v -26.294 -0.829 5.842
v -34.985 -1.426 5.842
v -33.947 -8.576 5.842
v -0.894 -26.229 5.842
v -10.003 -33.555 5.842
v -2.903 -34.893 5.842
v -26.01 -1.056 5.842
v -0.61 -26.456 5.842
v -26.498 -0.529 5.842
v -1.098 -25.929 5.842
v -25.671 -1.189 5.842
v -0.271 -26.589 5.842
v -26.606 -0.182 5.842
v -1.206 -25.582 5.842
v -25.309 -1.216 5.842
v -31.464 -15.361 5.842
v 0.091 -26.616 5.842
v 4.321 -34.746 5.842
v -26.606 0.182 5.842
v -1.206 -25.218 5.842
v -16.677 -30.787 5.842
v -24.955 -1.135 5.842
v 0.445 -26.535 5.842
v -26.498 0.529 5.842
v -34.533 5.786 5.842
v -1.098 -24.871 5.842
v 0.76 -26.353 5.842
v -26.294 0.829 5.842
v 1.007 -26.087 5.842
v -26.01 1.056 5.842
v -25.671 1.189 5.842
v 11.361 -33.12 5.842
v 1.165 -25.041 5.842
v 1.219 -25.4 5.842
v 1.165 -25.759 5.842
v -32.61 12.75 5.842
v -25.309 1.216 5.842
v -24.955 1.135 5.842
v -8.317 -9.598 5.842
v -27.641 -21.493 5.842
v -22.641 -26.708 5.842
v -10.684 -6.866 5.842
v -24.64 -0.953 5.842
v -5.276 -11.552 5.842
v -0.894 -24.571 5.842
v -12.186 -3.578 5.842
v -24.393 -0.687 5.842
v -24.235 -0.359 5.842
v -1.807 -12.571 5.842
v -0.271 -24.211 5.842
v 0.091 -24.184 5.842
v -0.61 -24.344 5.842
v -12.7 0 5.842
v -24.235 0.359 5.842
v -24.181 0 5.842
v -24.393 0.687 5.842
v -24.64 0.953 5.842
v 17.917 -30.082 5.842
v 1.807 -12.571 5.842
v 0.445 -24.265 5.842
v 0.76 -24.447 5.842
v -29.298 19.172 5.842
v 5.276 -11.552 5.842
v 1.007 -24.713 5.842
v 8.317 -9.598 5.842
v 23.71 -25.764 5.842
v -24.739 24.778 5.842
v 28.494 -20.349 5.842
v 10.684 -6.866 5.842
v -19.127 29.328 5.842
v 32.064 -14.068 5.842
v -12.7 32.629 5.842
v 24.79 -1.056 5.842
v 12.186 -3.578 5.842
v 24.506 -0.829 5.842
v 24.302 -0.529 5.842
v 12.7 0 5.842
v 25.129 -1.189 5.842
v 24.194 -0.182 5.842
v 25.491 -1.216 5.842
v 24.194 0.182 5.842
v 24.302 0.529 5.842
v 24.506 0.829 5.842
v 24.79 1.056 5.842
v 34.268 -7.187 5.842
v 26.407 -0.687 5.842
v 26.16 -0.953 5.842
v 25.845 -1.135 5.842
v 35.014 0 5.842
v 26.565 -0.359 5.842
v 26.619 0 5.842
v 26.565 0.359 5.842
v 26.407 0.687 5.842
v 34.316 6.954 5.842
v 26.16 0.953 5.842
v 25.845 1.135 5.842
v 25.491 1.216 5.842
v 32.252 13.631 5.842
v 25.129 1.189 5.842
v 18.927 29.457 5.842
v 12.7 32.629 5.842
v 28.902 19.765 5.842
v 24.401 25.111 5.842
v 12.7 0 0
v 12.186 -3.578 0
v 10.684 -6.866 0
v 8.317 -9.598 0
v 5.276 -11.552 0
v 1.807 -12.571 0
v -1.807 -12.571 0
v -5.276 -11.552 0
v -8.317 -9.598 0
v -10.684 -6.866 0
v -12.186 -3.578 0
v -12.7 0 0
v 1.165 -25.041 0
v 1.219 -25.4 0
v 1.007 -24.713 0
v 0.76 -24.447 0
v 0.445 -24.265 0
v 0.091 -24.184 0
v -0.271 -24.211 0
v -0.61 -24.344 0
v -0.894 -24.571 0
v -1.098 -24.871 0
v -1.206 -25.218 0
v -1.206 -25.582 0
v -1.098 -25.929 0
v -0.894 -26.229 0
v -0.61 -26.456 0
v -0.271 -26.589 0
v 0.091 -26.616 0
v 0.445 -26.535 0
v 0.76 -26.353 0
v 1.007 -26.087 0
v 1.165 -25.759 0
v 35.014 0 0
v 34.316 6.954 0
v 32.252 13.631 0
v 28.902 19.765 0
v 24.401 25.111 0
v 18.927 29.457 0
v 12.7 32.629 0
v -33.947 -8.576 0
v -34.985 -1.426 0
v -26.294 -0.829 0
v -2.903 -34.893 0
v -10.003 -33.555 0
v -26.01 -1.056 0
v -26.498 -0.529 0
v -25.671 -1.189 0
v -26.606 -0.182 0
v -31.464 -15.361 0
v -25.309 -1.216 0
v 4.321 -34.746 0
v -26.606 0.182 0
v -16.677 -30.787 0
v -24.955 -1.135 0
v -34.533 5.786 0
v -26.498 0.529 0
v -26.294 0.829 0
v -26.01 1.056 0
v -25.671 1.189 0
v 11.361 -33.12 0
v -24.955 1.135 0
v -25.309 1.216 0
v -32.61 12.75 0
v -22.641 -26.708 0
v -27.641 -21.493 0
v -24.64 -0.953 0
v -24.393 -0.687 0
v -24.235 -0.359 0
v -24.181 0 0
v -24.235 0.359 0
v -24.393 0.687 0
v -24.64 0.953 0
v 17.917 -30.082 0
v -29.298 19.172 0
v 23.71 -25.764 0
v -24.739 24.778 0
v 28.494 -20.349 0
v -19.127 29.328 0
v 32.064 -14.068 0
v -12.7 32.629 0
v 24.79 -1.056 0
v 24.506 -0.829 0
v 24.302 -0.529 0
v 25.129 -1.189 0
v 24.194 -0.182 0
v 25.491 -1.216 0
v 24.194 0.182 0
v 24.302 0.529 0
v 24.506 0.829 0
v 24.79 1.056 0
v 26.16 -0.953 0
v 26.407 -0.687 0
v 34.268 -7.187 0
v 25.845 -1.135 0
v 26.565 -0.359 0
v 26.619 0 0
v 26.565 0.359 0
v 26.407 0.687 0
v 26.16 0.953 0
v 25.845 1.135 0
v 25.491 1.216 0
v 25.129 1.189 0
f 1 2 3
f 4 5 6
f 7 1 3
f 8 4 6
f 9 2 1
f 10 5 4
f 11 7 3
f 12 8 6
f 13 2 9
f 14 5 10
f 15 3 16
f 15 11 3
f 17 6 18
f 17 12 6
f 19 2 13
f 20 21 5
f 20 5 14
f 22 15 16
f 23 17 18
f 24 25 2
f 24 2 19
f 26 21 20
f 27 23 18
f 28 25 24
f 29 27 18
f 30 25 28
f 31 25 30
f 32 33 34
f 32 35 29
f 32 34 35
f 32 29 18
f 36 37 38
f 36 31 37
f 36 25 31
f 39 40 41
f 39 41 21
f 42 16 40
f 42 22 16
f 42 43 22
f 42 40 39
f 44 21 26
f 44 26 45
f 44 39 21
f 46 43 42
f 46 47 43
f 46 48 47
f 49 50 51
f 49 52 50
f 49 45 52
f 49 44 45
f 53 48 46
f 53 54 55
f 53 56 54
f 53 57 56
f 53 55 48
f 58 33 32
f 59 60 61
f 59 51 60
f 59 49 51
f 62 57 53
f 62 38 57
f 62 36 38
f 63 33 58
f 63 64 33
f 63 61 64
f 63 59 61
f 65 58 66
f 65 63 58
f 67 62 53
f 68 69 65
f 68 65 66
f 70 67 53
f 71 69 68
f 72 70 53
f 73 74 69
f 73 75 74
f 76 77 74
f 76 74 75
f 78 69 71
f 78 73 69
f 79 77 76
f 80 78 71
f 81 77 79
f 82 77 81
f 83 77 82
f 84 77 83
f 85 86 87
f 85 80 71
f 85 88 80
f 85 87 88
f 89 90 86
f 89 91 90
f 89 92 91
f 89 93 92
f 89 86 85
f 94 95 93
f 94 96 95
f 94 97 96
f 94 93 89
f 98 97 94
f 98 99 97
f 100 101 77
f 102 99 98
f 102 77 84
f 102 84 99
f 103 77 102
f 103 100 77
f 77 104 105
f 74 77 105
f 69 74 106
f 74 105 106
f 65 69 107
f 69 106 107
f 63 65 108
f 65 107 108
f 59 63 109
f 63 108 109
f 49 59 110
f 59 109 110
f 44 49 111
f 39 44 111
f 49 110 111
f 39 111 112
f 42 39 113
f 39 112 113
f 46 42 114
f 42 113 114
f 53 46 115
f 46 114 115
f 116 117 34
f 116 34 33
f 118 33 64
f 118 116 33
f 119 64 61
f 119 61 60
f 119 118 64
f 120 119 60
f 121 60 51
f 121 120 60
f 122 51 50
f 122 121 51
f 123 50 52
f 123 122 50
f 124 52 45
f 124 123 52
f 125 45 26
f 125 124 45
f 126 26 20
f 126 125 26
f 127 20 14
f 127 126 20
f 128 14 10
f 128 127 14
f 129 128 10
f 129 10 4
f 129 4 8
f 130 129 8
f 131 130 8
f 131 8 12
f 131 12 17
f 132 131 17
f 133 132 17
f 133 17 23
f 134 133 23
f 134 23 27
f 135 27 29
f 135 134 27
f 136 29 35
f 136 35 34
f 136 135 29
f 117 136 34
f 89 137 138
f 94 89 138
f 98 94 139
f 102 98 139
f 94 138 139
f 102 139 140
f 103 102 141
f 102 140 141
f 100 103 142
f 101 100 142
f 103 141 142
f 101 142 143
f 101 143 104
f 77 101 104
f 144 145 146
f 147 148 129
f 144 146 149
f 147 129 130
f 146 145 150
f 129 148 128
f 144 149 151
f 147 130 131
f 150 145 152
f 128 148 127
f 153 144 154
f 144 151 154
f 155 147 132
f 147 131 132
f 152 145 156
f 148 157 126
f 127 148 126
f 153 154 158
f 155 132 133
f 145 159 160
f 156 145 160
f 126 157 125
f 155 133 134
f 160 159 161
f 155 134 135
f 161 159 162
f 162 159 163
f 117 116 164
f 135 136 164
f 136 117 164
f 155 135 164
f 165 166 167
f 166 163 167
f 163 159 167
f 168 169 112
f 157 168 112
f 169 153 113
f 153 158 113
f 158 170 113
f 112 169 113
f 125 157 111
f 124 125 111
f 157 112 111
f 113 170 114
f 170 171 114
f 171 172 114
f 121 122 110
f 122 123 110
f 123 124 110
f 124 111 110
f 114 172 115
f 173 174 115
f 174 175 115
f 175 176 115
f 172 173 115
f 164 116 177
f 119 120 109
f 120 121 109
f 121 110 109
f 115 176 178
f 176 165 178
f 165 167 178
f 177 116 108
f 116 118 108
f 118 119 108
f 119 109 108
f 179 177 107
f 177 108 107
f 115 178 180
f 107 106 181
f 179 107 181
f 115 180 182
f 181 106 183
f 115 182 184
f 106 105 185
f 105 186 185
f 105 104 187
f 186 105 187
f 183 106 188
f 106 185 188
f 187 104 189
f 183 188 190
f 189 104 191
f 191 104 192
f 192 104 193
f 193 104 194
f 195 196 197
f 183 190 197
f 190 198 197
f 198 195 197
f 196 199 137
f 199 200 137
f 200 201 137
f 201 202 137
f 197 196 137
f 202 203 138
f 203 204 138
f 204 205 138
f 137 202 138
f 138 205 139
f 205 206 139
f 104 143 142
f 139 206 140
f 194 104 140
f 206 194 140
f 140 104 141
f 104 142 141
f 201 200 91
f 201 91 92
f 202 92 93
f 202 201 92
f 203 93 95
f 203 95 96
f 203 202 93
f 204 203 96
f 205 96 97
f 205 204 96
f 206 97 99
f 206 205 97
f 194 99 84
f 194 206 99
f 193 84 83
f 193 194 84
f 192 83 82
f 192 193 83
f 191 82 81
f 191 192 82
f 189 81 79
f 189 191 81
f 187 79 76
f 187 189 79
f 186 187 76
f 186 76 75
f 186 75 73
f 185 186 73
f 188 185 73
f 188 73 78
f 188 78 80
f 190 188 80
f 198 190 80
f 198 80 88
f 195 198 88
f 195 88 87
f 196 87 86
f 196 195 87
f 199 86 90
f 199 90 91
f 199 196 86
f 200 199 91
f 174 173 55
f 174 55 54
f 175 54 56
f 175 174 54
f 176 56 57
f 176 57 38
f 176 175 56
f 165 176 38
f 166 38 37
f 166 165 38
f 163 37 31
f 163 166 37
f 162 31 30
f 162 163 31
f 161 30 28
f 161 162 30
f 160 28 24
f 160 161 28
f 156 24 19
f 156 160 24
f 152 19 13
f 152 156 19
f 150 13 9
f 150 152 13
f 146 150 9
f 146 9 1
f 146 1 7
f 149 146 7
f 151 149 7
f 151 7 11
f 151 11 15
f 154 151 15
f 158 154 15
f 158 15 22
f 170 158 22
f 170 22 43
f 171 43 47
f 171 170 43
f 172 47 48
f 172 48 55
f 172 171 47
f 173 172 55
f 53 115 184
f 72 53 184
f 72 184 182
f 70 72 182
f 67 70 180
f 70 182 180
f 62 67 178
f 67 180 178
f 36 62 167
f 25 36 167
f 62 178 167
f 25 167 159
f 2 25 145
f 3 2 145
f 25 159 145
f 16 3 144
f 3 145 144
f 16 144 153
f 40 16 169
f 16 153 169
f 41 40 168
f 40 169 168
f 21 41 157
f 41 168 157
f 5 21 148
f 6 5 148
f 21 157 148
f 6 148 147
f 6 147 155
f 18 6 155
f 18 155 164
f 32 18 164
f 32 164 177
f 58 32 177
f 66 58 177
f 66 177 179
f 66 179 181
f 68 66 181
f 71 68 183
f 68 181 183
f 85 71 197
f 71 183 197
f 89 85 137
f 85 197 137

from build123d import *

# Parameters (mm, degrees)
SKETCH1_R           = 1.2192
BOSS_EXTRUDE1_DEPTH = 5.842


with BuildPart() as part:
    # Sketch1 → Boss-Extrude1 (new body)
    with BuildSketch(Plane.XY):
        with BuildLine():
            Line((12.7, 32.629483496), (12.7, 0))
            ThreePointArc((12.7, 0), (0, -12.7), (-12.7, 0))
            Line((-12.7, 0), (-12.7, 32.629483496))
            ThreePointArc((-12.7, 32.629483496), (-19.764825615, -28.901987157), (35.0139, 0))
            ThreePointArc((35.0139, 0), (28.901987157, 19.764825615), (12.7, 32.629483496))
        make_face()
        with Locations((0, -25.4)):
            Circle(SKETCH1_R, mode=Mode.SUBTRACT)
        with Locations((-25.4, 0)):
            Circle(SKETCH1_R, mode=Mode.SUBTRACT)
        with Locations((25.4, 0)):
            Circle(SKETCH1_R, mode=Mode.SUBTRACT)
    extrude(amount=BOSS_EXTRUDE1_DEPTH)


solid = part.part
